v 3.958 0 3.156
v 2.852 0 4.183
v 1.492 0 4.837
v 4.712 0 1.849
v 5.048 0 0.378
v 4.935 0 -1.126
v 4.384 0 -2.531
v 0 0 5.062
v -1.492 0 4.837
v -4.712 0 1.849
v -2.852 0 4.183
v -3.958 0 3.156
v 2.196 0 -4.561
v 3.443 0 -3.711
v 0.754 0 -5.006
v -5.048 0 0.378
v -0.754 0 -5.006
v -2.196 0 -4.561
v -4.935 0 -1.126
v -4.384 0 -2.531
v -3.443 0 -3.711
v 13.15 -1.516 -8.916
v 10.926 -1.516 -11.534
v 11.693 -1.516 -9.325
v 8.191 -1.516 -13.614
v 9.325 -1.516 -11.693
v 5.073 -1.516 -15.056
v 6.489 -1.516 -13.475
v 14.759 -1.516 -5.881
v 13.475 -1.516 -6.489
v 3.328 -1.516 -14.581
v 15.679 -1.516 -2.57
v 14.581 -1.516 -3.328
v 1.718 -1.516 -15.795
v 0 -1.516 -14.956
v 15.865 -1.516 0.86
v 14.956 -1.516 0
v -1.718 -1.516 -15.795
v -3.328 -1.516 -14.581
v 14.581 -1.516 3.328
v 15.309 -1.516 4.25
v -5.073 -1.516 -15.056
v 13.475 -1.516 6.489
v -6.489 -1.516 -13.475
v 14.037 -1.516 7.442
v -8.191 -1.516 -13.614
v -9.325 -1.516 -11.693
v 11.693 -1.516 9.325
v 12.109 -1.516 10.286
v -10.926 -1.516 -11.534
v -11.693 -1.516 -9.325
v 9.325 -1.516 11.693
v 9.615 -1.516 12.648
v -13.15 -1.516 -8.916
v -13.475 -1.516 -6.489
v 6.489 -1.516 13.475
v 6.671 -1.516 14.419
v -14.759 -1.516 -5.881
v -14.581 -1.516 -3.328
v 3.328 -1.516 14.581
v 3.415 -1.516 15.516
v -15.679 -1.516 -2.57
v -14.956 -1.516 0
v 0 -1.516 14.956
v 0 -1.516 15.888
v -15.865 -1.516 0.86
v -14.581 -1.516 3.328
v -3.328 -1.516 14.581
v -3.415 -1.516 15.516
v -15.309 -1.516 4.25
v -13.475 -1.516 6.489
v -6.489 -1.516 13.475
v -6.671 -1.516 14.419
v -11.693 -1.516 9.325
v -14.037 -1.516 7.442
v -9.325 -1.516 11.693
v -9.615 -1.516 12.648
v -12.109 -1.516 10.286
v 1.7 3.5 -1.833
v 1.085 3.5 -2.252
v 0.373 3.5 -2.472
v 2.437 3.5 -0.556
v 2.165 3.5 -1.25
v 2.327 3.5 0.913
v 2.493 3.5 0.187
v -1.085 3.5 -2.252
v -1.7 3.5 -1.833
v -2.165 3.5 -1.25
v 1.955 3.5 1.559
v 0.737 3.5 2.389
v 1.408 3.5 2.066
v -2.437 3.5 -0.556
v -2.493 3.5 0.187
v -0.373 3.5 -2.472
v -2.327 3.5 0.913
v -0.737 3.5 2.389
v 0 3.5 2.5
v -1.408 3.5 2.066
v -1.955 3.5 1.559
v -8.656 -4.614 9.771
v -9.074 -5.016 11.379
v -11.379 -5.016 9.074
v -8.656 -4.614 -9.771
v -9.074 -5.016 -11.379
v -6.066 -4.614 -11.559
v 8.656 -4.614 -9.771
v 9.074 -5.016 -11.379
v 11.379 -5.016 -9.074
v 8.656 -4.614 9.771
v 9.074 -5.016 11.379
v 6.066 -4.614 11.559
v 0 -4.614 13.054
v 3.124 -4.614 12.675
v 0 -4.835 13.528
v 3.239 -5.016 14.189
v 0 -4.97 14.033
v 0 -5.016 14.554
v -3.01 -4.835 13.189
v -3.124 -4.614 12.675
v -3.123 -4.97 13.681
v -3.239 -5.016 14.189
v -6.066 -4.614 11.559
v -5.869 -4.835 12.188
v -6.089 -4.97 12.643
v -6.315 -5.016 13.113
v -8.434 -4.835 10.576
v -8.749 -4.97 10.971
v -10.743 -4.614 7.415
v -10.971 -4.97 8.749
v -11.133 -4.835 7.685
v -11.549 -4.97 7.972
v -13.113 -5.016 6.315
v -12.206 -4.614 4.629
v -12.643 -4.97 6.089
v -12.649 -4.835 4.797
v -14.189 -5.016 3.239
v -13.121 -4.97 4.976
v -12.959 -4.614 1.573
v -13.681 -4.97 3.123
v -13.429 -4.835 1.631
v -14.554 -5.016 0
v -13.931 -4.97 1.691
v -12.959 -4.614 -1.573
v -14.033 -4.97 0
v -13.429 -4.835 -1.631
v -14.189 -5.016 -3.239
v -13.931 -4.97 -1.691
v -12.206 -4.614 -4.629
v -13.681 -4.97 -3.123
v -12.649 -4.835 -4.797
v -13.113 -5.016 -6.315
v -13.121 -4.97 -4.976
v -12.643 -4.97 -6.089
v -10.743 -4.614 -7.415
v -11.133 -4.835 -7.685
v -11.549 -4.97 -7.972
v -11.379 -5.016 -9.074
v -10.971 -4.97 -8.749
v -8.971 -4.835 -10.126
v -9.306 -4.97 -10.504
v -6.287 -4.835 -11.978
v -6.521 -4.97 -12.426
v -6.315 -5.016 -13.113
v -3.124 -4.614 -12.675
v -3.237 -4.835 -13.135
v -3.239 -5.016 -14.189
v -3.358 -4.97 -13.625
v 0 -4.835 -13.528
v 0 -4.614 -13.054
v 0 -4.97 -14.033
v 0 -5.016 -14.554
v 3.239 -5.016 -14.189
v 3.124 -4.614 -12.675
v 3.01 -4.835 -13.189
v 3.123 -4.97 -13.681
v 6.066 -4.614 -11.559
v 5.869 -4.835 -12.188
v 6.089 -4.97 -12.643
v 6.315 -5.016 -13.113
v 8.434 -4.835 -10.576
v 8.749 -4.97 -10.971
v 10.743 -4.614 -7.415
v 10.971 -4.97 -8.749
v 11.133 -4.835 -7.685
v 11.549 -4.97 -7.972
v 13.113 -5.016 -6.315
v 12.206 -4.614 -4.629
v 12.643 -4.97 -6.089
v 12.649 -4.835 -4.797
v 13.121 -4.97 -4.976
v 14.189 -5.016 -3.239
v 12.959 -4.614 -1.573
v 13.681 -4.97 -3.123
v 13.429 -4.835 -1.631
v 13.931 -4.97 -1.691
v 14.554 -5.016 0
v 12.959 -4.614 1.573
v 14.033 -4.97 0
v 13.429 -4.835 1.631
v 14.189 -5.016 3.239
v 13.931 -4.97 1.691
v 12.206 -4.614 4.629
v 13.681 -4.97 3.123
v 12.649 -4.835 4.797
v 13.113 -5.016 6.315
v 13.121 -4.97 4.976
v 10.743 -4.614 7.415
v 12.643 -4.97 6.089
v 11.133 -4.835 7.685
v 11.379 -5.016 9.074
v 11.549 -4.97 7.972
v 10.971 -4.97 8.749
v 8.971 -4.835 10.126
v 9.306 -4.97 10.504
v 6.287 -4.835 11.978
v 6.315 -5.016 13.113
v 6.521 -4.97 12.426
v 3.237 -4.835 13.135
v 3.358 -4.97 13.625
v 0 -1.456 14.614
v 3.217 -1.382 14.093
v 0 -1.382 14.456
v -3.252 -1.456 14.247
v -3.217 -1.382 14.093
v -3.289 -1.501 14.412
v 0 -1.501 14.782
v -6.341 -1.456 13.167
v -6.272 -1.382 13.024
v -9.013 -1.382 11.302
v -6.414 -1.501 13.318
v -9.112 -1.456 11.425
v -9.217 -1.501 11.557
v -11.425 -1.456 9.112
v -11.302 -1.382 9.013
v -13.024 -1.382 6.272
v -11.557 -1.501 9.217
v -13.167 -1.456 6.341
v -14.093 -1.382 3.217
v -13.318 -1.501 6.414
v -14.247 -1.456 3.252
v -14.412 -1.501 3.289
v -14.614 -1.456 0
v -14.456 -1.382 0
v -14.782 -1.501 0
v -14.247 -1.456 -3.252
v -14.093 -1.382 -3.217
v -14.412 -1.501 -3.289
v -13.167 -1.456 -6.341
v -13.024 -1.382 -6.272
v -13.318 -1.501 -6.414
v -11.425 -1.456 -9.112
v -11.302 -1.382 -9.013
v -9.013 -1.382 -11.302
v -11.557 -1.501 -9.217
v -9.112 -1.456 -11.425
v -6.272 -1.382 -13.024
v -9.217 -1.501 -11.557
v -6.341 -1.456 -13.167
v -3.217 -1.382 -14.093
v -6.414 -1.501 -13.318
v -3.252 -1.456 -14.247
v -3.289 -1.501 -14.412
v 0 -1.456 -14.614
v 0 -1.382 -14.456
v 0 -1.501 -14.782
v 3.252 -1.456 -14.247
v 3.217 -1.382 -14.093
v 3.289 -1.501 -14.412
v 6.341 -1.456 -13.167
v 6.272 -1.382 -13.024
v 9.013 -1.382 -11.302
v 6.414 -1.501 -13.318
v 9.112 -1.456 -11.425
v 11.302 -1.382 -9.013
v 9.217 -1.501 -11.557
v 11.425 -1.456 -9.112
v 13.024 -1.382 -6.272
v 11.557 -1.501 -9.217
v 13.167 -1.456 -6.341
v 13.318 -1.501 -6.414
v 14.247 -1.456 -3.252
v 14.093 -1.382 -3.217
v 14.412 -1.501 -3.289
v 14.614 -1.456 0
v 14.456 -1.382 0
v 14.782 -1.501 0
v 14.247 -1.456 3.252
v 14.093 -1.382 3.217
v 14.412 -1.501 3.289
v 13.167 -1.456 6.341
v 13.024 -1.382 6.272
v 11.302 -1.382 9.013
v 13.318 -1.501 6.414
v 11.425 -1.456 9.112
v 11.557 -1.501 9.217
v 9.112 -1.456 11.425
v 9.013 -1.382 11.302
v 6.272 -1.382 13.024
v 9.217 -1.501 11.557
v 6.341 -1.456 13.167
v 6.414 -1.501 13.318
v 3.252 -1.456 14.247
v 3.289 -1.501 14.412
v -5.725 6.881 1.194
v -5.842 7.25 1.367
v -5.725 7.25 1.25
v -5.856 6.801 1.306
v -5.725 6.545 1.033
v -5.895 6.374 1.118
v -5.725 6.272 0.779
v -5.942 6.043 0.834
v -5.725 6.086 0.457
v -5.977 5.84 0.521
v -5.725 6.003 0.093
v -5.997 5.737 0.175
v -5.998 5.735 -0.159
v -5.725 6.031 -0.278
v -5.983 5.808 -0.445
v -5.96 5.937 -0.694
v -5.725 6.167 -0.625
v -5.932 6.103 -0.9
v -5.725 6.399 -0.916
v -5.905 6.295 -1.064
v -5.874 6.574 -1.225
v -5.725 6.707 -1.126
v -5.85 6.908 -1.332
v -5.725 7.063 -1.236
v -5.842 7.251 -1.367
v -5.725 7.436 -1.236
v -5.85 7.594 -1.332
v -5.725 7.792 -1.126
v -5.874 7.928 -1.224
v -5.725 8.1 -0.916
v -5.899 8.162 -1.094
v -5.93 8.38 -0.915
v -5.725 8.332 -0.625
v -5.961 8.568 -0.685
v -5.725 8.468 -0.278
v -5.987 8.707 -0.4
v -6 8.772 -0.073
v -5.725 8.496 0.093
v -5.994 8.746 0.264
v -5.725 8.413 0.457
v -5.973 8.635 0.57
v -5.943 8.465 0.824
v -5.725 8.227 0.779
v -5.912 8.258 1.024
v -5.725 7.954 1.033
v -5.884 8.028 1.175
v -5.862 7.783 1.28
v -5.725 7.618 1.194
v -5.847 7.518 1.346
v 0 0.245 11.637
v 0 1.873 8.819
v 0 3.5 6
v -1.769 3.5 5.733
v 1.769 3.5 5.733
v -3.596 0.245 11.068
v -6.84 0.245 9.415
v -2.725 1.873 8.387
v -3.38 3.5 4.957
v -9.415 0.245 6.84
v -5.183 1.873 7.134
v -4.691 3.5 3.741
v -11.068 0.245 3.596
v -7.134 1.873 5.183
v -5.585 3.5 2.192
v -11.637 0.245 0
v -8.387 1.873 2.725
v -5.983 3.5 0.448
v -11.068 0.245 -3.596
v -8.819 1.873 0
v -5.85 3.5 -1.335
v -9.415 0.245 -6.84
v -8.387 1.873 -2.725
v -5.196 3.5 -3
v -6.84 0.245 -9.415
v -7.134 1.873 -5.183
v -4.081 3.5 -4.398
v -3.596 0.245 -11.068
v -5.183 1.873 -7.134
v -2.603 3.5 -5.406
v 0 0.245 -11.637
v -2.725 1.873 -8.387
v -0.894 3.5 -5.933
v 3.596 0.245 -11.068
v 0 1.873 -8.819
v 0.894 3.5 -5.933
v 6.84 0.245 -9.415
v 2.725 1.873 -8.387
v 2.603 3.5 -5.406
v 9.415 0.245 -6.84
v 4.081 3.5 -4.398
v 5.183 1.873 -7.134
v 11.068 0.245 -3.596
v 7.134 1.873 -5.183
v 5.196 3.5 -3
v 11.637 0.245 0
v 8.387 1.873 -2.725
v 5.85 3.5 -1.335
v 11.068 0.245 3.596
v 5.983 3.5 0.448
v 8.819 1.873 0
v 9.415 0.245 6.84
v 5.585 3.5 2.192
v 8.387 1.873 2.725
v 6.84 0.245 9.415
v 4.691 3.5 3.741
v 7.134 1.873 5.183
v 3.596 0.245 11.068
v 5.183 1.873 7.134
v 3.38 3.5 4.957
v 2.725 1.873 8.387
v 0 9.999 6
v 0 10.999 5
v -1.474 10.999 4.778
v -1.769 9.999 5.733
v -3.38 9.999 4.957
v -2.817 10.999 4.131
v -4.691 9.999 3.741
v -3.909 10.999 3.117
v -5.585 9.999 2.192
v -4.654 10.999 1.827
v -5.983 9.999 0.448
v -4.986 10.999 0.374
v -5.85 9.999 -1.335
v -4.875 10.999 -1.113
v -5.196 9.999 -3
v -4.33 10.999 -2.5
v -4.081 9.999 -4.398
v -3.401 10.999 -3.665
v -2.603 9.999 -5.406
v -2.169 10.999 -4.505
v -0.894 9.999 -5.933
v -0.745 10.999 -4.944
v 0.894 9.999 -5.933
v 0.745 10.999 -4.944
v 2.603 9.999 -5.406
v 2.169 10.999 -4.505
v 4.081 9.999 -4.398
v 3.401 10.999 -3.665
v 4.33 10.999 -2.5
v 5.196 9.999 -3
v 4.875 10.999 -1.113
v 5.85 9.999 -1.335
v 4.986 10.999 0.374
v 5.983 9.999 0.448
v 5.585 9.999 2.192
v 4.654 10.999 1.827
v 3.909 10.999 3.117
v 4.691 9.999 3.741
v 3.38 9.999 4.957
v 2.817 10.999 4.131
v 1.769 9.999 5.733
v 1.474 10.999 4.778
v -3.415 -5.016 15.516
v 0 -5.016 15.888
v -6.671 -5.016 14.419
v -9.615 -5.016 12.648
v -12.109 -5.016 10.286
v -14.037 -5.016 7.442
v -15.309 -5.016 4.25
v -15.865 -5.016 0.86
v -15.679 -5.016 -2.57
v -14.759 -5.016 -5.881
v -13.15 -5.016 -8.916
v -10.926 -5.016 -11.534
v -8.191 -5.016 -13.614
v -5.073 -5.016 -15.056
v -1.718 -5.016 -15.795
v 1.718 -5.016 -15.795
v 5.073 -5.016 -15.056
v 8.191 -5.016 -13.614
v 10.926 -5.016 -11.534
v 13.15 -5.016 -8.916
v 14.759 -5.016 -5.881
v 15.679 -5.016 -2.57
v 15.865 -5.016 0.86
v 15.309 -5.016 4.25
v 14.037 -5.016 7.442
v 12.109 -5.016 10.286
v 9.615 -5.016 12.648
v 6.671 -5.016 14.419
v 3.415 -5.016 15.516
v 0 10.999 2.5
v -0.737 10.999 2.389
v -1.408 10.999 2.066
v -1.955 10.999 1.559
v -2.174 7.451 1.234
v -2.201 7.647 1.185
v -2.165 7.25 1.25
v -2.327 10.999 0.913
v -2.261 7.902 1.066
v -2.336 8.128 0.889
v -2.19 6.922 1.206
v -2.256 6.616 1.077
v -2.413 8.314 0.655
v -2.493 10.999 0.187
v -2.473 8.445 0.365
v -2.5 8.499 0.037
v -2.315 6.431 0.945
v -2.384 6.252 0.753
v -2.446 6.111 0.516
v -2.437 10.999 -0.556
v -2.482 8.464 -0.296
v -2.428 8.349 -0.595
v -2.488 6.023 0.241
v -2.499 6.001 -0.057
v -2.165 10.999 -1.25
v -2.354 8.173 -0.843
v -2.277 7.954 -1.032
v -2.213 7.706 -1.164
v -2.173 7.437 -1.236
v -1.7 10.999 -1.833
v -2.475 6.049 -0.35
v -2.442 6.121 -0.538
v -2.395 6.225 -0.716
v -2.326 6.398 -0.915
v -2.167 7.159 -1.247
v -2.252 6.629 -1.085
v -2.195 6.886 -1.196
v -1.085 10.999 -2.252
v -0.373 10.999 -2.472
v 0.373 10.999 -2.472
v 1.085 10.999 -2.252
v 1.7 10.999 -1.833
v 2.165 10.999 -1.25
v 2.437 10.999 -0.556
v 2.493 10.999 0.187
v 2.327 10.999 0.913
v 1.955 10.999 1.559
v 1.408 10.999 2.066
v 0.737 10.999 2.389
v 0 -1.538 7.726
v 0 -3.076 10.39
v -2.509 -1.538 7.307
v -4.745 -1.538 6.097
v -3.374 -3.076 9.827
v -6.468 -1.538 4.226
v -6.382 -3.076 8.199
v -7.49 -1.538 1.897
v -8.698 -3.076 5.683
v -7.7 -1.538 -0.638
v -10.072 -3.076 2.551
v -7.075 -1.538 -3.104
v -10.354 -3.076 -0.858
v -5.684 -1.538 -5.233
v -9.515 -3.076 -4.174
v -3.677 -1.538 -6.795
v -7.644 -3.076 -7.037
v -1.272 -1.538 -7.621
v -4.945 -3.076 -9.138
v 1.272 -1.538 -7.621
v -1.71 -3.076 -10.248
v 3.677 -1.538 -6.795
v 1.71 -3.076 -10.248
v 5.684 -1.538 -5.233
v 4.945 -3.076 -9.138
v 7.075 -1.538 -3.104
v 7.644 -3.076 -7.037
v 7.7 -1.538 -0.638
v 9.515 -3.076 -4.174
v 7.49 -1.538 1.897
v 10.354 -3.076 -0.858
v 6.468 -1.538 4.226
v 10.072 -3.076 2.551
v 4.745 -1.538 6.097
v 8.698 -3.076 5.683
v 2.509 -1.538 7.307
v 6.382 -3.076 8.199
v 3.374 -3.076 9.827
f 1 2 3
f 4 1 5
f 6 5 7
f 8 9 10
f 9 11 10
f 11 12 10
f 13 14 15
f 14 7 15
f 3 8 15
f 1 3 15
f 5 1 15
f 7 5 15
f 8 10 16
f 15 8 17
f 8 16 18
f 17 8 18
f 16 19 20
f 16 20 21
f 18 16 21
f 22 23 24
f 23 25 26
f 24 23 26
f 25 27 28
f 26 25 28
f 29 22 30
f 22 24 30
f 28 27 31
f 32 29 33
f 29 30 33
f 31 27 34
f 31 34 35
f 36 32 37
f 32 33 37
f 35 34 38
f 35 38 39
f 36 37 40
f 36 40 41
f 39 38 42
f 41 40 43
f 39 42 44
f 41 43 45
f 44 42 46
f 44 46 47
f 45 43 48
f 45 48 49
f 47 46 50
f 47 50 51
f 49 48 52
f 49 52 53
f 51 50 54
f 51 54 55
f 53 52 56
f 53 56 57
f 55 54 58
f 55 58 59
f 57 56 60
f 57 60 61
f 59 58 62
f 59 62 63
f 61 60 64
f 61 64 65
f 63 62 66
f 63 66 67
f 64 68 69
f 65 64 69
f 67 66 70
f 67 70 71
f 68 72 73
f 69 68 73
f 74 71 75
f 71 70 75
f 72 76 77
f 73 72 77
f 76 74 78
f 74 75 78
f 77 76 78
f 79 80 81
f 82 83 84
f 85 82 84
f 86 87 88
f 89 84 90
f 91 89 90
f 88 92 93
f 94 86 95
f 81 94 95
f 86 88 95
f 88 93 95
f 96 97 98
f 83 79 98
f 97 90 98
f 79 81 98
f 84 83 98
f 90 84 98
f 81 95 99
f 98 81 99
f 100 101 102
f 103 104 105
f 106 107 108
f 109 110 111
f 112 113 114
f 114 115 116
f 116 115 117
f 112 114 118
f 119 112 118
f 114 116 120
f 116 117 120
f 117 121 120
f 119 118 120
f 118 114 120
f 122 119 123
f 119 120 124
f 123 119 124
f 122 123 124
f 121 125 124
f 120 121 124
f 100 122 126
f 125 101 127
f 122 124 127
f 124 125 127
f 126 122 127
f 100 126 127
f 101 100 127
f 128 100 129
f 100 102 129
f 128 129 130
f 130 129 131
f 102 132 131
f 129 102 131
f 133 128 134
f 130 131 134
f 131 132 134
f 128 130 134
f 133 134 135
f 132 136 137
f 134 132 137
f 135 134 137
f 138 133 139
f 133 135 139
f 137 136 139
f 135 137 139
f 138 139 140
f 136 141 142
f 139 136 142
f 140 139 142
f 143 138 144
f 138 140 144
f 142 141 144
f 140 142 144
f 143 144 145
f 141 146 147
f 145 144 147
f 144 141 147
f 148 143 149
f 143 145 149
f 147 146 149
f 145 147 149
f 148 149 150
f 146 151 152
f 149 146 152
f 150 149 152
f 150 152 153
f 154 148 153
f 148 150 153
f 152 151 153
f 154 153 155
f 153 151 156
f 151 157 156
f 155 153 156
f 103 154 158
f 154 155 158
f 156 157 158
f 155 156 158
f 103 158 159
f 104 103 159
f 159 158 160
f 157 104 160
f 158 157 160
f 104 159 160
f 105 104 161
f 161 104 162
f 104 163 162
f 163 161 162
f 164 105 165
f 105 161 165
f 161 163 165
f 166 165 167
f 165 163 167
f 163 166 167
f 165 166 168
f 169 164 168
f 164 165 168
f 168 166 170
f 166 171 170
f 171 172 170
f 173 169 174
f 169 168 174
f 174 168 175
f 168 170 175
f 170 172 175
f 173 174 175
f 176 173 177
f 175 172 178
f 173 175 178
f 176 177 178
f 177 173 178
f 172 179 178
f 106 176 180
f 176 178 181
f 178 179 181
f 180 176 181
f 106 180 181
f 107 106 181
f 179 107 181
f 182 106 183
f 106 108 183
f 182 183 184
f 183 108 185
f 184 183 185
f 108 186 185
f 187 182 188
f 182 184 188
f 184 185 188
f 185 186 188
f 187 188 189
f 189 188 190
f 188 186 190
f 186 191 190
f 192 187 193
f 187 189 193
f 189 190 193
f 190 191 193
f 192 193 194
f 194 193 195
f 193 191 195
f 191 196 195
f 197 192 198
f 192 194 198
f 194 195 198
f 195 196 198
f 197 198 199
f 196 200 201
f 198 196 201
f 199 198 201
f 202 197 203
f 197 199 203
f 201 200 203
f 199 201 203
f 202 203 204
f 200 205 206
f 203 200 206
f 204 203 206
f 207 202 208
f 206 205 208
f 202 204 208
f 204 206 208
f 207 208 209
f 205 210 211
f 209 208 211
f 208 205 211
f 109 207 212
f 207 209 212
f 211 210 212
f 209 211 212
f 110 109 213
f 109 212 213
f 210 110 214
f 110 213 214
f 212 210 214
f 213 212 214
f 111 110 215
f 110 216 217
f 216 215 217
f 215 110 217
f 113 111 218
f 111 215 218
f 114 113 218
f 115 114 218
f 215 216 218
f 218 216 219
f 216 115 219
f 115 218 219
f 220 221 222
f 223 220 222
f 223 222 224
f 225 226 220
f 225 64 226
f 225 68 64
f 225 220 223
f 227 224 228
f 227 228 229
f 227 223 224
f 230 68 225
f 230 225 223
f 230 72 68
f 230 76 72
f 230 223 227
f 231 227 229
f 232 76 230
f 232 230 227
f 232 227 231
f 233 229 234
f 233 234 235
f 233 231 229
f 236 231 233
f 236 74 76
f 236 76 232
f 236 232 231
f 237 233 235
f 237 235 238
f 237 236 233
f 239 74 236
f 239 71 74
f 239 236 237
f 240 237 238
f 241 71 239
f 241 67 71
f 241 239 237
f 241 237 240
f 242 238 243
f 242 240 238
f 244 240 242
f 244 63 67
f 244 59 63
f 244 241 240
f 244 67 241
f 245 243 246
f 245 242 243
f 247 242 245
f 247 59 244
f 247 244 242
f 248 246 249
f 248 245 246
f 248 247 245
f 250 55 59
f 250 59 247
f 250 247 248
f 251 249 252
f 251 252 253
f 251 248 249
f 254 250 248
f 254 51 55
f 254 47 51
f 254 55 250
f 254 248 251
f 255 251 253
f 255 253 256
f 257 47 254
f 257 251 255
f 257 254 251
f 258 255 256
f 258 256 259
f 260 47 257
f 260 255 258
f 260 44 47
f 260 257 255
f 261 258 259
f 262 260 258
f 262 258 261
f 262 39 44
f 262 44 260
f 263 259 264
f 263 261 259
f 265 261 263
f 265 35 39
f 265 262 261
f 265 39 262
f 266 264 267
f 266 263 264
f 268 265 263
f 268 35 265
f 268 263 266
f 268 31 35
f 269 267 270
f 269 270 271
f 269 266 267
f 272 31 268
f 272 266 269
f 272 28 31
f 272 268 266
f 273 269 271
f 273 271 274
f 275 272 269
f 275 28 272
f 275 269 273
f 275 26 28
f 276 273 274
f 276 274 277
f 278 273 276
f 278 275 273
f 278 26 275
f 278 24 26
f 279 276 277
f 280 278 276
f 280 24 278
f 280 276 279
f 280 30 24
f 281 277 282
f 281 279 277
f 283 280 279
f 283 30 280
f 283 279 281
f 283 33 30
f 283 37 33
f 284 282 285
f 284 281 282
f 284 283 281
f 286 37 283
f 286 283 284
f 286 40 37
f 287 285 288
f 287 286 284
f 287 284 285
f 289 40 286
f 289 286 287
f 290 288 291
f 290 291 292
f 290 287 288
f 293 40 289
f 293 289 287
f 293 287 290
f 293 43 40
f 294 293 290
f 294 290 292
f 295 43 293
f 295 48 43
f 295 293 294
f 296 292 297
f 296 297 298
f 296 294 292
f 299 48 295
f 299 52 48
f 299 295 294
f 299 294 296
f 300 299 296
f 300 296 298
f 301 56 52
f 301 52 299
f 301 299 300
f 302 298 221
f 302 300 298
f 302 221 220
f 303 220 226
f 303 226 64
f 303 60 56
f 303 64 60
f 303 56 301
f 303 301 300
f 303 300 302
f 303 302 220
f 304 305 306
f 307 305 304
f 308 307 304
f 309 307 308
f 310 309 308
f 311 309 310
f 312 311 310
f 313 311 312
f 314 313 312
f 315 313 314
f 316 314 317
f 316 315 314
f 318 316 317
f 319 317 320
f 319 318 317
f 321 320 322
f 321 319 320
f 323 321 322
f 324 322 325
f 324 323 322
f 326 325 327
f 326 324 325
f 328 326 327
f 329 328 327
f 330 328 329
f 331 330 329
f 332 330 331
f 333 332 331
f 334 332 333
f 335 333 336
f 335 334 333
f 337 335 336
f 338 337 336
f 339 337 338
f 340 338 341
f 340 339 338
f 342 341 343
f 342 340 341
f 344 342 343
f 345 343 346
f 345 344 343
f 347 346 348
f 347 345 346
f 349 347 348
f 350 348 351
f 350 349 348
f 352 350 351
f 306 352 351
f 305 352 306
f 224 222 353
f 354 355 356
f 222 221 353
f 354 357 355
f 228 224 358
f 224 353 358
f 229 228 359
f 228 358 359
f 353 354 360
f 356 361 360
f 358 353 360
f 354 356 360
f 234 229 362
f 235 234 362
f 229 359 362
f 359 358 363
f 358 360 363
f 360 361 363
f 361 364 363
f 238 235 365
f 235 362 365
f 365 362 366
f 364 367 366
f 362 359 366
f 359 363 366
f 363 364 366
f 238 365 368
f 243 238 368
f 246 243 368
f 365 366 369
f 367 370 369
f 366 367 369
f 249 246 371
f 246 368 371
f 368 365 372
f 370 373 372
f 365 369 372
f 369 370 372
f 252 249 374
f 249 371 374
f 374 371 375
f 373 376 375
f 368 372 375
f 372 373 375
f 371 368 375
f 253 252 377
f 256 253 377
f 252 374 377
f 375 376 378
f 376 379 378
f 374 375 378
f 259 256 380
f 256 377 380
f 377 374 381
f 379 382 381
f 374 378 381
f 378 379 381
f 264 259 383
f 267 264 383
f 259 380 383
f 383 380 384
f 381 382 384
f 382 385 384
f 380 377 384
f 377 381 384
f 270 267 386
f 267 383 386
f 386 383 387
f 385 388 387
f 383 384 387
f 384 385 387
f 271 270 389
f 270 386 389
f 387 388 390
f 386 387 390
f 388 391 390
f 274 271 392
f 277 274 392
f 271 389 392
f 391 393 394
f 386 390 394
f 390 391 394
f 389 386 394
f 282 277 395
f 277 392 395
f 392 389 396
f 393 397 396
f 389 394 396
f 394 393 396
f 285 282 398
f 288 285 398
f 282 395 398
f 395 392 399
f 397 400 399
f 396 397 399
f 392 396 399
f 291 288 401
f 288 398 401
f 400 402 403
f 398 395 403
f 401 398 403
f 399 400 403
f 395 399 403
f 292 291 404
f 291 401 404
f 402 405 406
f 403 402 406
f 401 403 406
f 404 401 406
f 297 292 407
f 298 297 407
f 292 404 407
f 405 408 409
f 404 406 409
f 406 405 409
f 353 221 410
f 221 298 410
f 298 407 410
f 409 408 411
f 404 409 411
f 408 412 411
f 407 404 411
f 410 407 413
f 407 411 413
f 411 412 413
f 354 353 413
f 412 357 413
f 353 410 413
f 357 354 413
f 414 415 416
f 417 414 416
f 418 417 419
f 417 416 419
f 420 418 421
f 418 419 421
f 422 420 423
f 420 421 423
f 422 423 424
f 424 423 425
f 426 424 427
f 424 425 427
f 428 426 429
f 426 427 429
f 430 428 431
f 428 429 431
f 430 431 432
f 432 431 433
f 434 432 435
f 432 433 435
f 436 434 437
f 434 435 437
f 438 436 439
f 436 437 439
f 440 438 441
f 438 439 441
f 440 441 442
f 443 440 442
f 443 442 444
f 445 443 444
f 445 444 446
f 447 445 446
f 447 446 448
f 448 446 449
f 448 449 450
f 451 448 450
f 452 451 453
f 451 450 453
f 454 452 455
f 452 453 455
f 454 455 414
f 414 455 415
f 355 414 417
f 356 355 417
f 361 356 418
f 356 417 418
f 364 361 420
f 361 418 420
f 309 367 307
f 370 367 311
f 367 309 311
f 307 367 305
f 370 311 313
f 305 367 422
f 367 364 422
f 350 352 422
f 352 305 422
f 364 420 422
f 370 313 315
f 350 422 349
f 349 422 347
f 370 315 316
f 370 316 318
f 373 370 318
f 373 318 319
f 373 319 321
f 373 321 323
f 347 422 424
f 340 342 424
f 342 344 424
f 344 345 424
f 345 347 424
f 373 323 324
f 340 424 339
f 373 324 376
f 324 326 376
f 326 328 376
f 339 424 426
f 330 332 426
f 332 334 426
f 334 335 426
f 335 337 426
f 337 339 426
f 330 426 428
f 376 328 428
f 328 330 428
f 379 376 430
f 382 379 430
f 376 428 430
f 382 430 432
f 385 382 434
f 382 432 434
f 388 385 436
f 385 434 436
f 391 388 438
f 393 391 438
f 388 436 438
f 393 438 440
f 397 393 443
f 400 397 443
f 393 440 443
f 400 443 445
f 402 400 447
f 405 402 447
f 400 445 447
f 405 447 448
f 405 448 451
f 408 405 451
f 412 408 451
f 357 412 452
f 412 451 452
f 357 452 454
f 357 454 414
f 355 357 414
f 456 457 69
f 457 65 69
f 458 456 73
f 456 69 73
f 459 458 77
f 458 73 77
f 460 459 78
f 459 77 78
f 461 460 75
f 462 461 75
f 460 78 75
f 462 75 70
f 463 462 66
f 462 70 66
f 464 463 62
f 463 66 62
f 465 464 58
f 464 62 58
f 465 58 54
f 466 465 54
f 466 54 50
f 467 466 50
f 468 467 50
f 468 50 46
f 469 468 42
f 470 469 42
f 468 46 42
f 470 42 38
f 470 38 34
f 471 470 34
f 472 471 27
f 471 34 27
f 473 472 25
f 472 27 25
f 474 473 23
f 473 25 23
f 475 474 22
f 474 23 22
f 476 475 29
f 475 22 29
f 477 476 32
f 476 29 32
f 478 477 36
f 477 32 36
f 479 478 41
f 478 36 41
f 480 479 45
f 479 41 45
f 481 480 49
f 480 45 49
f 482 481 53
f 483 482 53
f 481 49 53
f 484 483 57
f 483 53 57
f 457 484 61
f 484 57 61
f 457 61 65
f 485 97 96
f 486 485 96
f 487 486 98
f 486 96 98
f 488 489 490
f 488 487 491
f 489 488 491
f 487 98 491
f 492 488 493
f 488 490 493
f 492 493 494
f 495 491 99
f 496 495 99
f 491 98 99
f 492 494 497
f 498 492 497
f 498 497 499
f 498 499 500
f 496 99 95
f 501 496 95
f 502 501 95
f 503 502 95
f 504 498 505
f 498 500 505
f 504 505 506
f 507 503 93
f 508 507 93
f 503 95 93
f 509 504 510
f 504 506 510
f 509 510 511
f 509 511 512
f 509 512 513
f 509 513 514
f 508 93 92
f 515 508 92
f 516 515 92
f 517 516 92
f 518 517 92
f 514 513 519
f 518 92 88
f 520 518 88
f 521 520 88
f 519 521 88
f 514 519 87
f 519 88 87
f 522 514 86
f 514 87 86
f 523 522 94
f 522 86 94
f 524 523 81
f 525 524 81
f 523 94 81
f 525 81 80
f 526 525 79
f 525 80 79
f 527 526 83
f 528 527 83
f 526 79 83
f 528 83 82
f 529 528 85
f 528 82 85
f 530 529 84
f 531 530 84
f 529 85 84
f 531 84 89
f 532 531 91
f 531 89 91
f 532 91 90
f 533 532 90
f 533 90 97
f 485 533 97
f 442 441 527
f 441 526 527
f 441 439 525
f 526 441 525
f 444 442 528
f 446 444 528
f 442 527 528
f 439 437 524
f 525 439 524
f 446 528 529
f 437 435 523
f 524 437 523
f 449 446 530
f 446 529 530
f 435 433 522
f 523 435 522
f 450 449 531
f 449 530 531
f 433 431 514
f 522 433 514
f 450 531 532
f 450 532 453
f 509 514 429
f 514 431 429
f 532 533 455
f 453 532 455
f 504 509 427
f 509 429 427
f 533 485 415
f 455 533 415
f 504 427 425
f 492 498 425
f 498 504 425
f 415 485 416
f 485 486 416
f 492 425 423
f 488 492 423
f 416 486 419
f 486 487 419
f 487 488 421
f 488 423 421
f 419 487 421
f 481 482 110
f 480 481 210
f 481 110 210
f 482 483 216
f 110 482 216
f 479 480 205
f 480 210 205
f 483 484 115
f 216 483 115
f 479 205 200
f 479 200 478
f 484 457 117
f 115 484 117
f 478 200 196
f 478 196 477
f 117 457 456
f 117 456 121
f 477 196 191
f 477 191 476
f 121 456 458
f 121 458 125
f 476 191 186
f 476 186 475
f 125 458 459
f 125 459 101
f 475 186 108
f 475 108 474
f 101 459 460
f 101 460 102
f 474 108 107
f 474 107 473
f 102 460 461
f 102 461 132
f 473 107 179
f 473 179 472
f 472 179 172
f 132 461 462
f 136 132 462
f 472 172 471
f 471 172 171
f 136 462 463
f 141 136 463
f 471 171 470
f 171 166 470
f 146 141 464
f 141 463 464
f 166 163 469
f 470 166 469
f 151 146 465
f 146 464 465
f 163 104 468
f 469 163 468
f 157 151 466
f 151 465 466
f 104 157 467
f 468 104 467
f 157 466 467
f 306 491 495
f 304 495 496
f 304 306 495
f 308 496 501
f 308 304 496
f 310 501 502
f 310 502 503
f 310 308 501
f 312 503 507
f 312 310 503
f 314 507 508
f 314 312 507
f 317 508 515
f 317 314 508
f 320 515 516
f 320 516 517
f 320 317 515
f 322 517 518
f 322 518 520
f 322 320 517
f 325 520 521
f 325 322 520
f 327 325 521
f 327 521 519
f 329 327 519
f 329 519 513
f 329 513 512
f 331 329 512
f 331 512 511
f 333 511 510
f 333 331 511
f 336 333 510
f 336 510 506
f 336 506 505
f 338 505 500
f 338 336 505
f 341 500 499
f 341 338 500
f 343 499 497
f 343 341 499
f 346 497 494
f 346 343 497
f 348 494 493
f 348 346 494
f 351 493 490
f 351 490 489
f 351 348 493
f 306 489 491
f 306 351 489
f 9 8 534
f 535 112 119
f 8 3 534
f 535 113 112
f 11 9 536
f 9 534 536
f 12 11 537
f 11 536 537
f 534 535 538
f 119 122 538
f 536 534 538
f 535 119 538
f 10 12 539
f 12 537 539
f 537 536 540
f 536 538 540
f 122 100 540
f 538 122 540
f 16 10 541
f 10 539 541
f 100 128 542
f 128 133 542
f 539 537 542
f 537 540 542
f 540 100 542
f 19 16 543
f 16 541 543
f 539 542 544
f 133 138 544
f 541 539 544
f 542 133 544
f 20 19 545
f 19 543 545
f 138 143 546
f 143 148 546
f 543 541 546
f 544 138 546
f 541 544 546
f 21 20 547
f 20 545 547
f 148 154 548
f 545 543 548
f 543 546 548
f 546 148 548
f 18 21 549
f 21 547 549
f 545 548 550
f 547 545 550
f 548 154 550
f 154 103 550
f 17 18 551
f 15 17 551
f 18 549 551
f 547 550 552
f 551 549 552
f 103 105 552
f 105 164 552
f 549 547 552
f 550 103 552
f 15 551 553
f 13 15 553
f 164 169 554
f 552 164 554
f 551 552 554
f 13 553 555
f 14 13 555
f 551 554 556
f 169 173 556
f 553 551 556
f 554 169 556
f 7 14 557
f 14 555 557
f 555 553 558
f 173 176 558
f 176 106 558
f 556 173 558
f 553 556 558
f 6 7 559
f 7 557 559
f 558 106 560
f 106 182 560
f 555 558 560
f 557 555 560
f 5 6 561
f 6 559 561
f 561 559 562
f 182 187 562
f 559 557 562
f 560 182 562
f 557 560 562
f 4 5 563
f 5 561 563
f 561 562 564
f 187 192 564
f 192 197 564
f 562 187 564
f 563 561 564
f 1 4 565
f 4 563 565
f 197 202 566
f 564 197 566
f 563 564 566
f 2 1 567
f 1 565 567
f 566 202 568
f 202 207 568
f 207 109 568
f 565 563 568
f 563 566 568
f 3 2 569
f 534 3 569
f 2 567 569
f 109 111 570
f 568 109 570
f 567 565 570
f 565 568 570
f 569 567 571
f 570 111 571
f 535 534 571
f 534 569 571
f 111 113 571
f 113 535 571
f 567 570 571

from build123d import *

# Parameters (mm, degrees)
FILLET1_R     = 3
CHAMFER1_SIZE = 1
FILLET2_R     = 1


with BuildPart() as part:
    # Sketch1 → Revolve1 (revolve)
    with BuildSketch(Plane.XY, mode=Mode.PRIVATE) as revolve1_sk:
        Polygon((6, 10.999045222), (2.5, 10.999045222), (2.5, 3.5), (0, 3.5), (0, 0), (5.062177826, 0), (13.75, -5.015916471), (15.887822174, -5.015916471), (15.887822174, -1.515916471), (14.687822174, -1.515916471), (6, 3.5), align=None)
    revolve(revolve1_sk.sketch.rotate(Axis((0, 31.975823544, 0), (0, -1, 0)), 90), axis=Axis((0, 31.975823544, 0), (0, -1, 0)))

    # Fillet1
    fillet1_edges = [part.edges().sort_by_distance(p)[0] for p in [
        (0, -5.015916471, -13.75),
    ]]
    fillet(fillet1_edges, radius=FILLET1_R)

    # Chamfer1
    chamfer1_edges = [part.edges().sort_by_distance(p)[0] for p in [
        (0, 10.999045222, -6),
    ]]
    chamfer(chamfer1_edges, length=CHAMFER1_SIZE)

    # Fillet2
    fillet2_edges = [part.edges().sort_by_distance(p)[0] for p in [
        (0, -1.515916471, -14.687822174),
    ]]
    fillet(fillet2_edges, radius=FILLET2_R)

    # Sketch4 → M3 Tapped Hole1 (revolve, cut)
    with BuildSketch(Plane(origin=(-6, 7.249522611, 0), x_dir=(0, 0, 1), z_dir=(0, 1, 0))):
        Polygon((0, 0), (0, 7.251075774), (1.25, 6.5), (1.25, 0.275), (1.525, 0), align=None)
    revolve(axis=Axis((-12.35, 7.249522611, 0), (1, 0, 0)), mode=Mode.SUBTRACT)


solid = part.part
